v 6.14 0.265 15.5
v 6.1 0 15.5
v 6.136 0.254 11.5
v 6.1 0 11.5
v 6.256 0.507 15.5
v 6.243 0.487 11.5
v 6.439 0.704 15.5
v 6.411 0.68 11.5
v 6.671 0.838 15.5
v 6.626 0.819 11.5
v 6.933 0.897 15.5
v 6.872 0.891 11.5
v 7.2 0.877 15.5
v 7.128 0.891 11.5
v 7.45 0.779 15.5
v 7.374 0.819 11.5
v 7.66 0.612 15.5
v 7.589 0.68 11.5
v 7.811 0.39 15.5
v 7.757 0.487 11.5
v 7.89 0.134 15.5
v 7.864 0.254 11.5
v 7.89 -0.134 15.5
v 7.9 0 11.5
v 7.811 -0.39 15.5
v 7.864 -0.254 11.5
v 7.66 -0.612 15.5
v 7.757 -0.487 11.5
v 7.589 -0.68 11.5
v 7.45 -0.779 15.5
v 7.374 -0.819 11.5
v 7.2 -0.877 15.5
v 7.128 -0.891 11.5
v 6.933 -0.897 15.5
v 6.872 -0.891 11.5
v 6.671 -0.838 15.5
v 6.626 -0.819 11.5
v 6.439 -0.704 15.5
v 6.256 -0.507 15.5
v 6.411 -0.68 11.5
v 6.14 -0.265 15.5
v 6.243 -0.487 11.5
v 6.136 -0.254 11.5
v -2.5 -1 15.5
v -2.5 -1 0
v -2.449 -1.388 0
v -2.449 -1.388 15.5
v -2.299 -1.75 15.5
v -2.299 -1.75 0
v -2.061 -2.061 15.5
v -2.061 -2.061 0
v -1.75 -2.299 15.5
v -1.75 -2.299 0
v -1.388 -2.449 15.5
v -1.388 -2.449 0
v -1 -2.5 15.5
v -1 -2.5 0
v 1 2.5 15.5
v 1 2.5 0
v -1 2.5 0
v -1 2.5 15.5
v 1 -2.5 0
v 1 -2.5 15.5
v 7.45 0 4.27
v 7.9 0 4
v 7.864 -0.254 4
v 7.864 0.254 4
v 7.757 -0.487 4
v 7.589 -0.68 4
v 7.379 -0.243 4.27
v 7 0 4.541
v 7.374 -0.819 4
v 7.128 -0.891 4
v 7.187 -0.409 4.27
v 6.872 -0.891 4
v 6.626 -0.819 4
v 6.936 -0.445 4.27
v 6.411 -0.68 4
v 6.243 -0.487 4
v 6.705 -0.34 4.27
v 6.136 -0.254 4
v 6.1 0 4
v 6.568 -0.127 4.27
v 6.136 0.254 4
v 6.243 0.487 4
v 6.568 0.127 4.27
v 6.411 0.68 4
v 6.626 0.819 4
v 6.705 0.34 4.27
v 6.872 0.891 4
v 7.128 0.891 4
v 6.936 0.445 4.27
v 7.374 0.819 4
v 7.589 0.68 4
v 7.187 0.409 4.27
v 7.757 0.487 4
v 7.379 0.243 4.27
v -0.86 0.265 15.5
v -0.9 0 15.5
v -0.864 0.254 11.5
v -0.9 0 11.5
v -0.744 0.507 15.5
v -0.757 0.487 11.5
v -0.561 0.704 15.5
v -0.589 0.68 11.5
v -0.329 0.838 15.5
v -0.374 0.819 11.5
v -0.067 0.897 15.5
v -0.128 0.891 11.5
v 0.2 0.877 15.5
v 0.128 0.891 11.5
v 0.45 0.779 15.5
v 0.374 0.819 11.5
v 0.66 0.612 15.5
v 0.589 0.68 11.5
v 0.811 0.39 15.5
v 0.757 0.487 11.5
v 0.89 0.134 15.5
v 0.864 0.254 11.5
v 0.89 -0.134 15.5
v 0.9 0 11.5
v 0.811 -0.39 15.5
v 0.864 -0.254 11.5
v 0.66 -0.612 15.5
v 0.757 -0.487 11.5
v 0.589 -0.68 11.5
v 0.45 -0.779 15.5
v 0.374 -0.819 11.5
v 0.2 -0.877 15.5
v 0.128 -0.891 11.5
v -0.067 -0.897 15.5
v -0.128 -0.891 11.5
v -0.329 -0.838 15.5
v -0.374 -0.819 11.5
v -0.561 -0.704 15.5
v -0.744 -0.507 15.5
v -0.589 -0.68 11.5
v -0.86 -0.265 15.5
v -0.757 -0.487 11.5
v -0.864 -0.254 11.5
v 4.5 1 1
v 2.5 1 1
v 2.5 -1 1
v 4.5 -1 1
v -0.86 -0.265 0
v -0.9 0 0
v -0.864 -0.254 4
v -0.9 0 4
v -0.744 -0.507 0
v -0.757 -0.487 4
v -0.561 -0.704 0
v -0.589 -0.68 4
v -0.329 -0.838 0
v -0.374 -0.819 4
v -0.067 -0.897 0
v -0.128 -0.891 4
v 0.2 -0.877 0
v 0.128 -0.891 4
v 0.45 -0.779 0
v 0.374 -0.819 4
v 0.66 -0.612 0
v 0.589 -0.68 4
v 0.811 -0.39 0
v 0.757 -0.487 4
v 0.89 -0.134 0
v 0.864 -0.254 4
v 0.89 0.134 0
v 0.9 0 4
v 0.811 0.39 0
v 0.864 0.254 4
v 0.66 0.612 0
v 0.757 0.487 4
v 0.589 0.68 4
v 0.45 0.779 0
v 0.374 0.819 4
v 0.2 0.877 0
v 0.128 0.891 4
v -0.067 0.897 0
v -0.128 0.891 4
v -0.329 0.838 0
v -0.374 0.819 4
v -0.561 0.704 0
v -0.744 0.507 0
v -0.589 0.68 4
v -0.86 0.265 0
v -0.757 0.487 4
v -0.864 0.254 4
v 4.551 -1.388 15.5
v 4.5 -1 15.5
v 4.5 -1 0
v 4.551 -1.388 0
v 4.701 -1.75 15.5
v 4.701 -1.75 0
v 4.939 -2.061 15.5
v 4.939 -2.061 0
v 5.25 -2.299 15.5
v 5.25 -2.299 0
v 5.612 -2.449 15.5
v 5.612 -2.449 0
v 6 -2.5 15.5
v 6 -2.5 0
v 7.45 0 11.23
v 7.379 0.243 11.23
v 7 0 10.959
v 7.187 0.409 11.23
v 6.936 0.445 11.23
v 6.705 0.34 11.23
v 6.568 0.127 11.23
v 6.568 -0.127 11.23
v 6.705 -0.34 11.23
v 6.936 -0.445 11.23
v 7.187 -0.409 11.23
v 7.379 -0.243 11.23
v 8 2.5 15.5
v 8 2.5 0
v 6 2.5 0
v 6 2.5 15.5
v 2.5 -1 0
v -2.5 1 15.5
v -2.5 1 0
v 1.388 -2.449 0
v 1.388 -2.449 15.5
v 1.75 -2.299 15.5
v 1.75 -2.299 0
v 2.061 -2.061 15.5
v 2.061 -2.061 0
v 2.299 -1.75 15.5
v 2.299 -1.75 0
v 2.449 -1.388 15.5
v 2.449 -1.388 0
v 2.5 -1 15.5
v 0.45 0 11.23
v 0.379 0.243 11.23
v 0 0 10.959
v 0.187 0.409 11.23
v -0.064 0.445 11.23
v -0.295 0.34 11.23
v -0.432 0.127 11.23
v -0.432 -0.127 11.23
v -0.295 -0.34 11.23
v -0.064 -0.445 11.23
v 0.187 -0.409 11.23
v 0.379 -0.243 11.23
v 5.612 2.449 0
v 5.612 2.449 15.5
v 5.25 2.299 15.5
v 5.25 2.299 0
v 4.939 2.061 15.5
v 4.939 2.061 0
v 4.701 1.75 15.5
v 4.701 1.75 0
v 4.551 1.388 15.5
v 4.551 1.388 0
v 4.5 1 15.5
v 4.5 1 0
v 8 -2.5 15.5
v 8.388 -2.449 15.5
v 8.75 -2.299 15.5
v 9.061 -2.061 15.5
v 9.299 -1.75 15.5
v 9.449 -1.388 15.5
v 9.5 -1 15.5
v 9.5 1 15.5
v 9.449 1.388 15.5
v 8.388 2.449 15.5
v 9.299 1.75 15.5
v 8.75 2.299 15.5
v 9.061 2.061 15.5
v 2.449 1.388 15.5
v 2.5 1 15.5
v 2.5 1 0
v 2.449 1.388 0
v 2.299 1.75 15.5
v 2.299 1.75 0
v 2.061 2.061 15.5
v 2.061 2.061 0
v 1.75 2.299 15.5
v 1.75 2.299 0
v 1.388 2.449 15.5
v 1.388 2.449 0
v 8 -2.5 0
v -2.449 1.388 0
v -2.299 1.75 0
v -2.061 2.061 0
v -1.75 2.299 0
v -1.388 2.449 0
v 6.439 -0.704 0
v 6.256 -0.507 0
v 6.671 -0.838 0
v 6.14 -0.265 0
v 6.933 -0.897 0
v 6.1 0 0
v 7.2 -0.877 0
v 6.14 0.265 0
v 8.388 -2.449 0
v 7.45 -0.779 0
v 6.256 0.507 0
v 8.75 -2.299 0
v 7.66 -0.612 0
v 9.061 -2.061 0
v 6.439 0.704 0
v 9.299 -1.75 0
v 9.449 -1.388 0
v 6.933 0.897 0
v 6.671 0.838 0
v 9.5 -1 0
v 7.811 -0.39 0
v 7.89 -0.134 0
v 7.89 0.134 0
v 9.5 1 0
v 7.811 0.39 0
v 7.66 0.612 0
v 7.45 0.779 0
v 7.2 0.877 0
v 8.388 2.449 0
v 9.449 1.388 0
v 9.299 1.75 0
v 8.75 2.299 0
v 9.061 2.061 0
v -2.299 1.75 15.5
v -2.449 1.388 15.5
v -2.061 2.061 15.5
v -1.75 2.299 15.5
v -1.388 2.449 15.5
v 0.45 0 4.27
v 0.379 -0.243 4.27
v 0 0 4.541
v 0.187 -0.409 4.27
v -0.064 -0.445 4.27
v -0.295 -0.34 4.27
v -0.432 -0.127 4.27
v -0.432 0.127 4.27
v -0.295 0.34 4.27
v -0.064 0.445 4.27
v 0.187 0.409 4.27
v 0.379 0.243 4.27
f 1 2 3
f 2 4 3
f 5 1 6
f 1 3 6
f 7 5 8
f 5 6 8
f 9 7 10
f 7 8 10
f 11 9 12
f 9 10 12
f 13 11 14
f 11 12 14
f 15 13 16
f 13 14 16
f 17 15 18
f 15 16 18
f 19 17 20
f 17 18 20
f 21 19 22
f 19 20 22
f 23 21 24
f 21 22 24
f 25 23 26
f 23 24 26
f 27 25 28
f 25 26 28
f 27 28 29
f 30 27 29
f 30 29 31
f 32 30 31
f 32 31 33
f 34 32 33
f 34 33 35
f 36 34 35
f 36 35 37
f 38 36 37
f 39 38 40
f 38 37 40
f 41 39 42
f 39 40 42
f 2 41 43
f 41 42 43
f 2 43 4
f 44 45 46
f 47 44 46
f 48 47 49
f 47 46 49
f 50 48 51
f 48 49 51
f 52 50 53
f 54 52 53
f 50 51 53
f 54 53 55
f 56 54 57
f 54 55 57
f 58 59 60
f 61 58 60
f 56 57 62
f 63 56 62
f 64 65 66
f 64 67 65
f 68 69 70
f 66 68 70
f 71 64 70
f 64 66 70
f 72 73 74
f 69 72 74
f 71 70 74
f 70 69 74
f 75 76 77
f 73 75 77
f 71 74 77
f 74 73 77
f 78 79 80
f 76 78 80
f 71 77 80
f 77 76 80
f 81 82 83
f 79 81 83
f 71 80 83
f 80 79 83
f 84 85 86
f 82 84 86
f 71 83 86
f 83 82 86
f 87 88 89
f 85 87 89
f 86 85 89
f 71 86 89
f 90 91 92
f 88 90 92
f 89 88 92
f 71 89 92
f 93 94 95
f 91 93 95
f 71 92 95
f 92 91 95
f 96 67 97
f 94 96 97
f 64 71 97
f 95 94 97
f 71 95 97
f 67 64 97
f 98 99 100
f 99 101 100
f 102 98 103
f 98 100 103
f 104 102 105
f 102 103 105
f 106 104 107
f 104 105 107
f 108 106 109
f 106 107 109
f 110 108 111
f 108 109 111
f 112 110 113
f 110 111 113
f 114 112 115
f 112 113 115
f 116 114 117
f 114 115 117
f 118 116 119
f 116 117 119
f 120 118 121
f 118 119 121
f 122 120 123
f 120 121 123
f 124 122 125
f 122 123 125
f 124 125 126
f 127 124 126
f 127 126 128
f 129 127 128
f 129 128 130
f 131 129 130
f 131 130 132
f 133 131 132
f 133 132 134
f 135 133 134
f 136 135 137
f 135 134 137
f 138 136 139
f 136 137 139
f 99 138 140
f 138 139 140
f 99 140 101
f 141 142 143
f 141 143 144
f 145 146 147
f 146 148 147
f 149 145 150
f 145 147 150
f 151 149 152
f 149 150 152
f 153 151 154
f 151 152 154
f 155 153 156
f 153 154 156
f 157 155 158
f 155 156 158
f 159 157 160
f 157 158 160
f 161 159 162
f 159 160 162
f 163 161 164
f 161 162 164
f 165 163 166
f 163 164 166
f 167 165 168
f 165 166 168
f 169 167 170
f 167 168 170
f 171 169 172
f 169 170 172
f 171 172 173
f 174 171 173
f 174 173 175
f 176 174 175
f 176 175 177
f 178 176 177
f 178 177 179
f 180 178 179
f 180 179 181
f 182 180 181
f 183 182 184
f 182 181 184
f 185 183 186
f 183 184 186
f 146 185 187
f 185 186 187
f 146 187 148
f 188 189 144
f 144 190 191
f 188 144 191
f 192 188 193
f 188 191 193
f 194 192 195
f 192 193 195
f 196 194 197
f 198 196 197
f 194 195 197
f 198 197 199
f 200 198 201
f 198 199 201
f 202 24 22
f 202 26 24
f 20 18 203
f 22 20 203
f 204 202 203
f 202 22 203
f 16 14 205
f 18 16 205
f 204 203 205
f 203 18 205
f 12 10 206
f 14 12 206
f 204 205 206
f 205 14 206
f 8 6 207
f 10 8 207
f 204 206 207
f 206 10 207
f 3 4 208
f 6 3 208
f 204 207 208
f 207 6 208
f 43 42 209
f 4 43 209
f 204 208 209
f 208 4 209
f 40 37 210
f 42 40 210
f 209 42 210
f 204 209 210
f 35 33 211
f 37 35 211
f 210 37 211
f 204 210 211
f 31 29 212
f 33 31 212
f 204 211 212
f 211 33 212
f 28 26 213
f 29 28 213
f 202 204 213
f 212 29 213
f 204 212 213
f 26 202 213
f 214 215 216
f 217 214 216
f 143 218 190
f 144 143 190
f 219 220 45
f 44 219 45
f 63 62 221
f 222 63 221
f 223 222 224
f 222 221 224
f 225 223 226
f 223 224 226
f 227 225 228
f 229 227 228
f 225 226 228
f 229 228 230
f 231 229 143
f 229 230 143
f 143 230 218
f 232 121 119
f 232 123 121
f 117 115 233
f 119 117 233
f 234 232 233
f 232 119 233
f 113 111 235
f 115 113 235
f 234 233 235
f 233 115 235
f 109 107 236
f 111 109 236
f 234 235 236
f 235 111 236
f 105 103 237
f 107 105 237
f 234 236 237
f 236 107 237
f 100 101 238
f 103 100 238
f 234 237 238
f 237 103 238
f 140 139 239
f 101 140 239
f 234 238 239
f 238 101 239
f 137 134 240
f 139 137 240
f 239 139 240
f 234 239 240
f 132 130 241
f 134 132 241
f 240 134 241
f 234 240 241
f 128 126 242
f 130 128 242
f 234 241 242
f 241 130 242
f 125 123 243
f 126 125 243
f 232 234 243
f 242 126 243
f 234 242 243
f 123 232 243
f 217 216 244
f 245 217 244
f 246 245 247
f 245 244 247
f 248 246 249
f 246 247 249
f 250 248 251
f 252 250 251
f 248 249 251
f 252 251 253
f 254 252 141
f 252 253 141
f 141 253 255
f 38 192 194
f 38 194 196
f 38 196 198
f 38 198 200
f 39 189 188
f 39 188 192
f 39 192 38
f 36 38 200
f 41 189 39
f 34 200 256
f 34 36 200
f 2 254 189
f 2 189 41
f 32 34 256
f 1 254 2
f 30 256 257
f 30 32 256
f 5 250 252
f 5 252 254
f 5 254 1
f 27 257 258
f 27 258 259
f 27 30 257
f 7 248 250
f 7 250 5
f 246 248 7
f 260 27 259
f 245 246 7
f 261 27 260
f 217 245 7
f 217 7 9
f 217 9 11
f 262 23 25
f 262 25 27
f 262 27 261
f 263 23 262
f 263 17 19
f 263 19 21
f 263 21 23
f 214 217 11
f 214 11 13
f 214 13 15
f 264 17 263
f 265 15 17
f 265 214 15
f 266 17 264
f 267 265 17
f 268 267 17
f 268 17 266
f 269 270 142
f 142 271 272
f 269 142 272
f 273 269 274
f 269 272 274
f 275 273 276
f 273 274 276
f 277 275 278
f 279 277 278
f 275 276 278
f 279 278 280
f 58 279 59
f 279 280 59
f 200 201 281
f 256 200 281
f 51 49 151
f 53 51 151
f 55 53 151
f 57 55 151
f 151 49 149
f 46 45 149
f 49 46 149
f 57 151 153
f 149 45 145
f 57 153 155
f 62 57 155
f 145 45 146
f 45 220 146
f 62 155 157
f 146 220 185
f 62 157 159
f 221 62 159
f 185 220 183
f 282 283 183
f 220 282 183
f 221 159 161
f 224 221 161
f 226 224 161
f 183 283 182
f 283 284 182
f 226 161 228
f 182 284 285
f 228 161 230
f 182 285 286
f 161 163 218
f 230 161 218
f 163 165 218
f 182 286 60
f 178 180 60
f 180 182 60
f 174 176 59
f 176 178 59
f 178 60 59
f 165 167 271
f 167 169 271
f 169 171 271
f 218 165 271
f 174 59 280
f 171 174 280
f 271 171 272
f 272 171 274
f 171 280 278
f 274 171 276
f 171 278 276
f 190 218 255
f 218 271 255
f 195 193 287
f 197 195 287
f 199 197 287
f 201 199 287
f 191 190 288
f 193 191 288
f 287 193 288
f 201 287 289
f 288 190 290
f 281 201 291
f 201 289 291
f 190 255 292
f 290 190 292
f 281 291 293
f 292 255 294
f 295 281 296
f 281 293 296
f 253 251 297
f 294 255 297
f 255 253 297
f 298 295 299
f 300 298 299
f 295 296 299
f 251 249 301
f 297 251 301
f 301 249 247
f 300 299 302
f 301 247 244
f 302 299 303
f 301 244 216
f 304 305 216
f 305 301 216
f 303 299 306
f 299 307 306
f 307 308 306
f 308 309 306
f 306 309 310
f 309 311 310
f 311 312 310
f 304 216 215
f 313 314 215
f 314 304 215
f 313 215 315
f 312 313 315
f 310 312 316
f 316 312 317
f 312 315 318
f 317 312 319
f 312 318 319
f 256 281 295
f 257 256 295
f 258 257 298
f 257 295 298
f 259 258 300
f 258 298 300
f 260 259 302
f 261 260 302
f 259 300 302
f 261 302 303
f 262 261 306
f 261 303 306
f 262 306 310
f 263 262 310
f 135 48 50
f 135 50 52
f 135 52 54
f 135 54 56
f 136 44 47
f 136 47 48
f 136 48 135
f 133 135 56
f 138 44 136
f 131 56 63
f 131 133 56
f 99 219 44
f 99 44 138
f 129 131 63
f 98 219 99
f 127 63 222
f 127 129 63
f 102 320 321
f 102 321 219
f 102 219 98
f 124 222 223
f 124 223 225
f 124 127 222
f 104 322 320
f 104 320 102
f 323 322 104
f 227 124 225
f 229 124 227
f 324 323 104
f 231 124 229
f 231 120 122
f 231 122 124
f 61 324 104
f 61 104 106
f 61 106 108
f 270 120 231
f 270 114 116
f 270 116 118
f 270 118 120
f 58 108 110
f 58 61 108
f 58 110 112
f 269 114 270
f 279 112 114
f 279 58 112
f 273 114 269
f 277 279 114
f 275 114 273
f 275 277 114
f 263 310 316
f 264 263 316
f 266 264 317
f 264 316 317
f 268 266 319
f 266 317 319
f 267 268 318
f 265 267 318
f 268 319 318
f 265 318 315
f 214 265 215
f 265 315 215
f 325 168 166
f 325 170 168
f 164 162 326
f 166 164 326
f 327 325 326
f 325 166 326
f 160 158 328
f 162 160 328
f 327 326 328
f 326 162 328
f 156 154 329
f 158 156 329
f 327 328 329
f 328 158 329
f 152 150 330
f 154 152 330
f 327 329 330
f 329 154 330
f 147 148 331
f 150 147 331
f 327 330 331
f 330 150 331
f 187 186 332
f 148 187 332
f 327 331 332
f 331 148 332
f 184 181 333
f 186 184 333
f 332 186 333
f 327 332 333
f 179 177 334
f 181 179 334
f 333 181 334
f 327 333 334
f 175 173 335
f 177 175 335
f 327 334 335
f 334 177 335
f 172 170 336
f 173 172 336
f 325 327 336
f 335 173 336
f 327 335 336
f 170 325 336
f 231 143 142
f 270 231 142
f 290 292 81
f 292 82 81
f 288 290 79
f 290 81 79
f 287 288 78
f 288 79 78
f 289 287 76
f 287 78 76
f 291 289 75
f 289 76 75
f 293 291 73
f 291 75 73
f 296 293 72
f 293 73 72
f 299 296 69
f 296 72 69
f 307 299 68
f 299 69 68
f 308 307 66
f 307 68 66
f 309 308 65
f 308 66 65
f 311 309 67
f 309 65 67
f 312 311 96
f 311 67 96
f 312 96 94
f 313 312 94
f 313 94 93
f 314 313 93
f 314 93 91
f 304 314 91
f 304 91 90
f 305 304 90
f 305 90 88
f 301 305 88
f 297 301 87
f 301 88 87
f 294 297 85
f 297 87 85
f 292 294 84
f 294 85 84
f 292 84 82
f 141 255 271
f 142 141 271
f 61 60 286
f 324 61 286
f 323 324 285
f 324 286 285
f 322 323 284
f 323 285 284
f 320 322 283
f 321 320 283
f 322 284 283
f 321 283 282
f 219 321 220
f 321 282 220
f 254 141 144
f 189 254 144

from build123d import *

# Parameters (mm, degrees)
F1_DEPTH = 15.5
F2_DEPTH = 1
F4_D     = 1.8
F4_DEPTH = 4
F4_TIP   = 0.5407745571
F5_D     = 1.8
F5_DEPTH = 4
F5_TIP   = 0.5407745571


with BuildPart() as f1:
    # F0 (on Top) → F1 (new body)
    with BuildSketch(Plane.XY):
        with BuildLine():
            Line((-1, -2.5), (1, -2.5))
            ThreePointArc((1, -2.5), (2.0606601718, -2.0606601718), (2.5, -1))
            Line((2.5, -1), (2.5, 1))
            ThreePointArc((2.5, 1), (2.0606601718, 2.0606601718), (1, 2.5))
            Line((1, 2.5), (-1, 2.5))
            ThreePointArc((-1, 2.5), (-2.0606601718, 2.0606601718), (-2.5, 1))
            Line((-2.5, 1), (-2.5, -1))
            ThreePointArc((-2.5, -1), (-2.0606601718, -2.0606601718), (-1, -2.5))
        make_face()
    extrude(amount=F1_DEPTH)



with BuildPart() as f1b:
    # F0 (on Top) → F1, piece 2 (new body)
    with BuildSketch(Plane.XY):
        with BuildLine():
            Line((4.5, 1), (4.5, -1))
            ThreePointArc((4.5, -1), (4.9393398282, -2.0606601718), (6, -2.5))
            Line((6, -2.5), (8, -2.5))
            ThreePointArc((8, -2.5), (9.0606601718, -2.0606601718), (9.5, -1))
            Line((9.5, -1), (9.5, 1))
            ThreePointArc((9.5, 1), (9.0606601718, 2.0606601718), (8, 2.5))
            Line((8, 2.5), (6, 2.5))
            ThreePointArc((6, 2.5), (4.9393398282, 2.0606601718), (4.5, 1))
        make_face()
    extrude(amount=F1_DEPTH)


with BuildPart() as f1_1:
    add(f1.part)

    add(f1b.part)  # F2 merges F1b
    # F0 (on Top) → F2 (join)
    with BuildSketch(Plane.XY):
        Polygon((2.5, 1), (2.5, -1), (3.5, -1), (4.5, -1), (4.5, 1), (3.5, 1), align=None)
    extrude(amount=F2_DEPTH)

    # F4
    with Locations(Plane.XY.offset(15.5)):
        with Locations((0, 0), (7, 0)):
            Hole(F4_D / 2, depth=F4_DEPTH)
            with Locations((0, 0, -(F4_DEPTH + F4_TIP / 2))):  # 118° drill point
                Cone(0, F4_D / 2, F4_TIP, mode=Mode.SUBTRACT)

    # F5
    with Locations(Plane(origin=(0, 0, 0), x_dir=(1, 0, 0), z_dir=(0, 0, -1))):
        with Locations((7, 0), (0, 0)):
            Hole(F5_D / 2, depth=F5_DEPTH)
            with Locations((0, 0, -(F5_DEPTH + F5_TIP / 2))):  # 118° drill point
                Cone(0, F5_D / 2, F5_TIP, mode=Mode.SUBTRACT)


solid = f1_1.part
